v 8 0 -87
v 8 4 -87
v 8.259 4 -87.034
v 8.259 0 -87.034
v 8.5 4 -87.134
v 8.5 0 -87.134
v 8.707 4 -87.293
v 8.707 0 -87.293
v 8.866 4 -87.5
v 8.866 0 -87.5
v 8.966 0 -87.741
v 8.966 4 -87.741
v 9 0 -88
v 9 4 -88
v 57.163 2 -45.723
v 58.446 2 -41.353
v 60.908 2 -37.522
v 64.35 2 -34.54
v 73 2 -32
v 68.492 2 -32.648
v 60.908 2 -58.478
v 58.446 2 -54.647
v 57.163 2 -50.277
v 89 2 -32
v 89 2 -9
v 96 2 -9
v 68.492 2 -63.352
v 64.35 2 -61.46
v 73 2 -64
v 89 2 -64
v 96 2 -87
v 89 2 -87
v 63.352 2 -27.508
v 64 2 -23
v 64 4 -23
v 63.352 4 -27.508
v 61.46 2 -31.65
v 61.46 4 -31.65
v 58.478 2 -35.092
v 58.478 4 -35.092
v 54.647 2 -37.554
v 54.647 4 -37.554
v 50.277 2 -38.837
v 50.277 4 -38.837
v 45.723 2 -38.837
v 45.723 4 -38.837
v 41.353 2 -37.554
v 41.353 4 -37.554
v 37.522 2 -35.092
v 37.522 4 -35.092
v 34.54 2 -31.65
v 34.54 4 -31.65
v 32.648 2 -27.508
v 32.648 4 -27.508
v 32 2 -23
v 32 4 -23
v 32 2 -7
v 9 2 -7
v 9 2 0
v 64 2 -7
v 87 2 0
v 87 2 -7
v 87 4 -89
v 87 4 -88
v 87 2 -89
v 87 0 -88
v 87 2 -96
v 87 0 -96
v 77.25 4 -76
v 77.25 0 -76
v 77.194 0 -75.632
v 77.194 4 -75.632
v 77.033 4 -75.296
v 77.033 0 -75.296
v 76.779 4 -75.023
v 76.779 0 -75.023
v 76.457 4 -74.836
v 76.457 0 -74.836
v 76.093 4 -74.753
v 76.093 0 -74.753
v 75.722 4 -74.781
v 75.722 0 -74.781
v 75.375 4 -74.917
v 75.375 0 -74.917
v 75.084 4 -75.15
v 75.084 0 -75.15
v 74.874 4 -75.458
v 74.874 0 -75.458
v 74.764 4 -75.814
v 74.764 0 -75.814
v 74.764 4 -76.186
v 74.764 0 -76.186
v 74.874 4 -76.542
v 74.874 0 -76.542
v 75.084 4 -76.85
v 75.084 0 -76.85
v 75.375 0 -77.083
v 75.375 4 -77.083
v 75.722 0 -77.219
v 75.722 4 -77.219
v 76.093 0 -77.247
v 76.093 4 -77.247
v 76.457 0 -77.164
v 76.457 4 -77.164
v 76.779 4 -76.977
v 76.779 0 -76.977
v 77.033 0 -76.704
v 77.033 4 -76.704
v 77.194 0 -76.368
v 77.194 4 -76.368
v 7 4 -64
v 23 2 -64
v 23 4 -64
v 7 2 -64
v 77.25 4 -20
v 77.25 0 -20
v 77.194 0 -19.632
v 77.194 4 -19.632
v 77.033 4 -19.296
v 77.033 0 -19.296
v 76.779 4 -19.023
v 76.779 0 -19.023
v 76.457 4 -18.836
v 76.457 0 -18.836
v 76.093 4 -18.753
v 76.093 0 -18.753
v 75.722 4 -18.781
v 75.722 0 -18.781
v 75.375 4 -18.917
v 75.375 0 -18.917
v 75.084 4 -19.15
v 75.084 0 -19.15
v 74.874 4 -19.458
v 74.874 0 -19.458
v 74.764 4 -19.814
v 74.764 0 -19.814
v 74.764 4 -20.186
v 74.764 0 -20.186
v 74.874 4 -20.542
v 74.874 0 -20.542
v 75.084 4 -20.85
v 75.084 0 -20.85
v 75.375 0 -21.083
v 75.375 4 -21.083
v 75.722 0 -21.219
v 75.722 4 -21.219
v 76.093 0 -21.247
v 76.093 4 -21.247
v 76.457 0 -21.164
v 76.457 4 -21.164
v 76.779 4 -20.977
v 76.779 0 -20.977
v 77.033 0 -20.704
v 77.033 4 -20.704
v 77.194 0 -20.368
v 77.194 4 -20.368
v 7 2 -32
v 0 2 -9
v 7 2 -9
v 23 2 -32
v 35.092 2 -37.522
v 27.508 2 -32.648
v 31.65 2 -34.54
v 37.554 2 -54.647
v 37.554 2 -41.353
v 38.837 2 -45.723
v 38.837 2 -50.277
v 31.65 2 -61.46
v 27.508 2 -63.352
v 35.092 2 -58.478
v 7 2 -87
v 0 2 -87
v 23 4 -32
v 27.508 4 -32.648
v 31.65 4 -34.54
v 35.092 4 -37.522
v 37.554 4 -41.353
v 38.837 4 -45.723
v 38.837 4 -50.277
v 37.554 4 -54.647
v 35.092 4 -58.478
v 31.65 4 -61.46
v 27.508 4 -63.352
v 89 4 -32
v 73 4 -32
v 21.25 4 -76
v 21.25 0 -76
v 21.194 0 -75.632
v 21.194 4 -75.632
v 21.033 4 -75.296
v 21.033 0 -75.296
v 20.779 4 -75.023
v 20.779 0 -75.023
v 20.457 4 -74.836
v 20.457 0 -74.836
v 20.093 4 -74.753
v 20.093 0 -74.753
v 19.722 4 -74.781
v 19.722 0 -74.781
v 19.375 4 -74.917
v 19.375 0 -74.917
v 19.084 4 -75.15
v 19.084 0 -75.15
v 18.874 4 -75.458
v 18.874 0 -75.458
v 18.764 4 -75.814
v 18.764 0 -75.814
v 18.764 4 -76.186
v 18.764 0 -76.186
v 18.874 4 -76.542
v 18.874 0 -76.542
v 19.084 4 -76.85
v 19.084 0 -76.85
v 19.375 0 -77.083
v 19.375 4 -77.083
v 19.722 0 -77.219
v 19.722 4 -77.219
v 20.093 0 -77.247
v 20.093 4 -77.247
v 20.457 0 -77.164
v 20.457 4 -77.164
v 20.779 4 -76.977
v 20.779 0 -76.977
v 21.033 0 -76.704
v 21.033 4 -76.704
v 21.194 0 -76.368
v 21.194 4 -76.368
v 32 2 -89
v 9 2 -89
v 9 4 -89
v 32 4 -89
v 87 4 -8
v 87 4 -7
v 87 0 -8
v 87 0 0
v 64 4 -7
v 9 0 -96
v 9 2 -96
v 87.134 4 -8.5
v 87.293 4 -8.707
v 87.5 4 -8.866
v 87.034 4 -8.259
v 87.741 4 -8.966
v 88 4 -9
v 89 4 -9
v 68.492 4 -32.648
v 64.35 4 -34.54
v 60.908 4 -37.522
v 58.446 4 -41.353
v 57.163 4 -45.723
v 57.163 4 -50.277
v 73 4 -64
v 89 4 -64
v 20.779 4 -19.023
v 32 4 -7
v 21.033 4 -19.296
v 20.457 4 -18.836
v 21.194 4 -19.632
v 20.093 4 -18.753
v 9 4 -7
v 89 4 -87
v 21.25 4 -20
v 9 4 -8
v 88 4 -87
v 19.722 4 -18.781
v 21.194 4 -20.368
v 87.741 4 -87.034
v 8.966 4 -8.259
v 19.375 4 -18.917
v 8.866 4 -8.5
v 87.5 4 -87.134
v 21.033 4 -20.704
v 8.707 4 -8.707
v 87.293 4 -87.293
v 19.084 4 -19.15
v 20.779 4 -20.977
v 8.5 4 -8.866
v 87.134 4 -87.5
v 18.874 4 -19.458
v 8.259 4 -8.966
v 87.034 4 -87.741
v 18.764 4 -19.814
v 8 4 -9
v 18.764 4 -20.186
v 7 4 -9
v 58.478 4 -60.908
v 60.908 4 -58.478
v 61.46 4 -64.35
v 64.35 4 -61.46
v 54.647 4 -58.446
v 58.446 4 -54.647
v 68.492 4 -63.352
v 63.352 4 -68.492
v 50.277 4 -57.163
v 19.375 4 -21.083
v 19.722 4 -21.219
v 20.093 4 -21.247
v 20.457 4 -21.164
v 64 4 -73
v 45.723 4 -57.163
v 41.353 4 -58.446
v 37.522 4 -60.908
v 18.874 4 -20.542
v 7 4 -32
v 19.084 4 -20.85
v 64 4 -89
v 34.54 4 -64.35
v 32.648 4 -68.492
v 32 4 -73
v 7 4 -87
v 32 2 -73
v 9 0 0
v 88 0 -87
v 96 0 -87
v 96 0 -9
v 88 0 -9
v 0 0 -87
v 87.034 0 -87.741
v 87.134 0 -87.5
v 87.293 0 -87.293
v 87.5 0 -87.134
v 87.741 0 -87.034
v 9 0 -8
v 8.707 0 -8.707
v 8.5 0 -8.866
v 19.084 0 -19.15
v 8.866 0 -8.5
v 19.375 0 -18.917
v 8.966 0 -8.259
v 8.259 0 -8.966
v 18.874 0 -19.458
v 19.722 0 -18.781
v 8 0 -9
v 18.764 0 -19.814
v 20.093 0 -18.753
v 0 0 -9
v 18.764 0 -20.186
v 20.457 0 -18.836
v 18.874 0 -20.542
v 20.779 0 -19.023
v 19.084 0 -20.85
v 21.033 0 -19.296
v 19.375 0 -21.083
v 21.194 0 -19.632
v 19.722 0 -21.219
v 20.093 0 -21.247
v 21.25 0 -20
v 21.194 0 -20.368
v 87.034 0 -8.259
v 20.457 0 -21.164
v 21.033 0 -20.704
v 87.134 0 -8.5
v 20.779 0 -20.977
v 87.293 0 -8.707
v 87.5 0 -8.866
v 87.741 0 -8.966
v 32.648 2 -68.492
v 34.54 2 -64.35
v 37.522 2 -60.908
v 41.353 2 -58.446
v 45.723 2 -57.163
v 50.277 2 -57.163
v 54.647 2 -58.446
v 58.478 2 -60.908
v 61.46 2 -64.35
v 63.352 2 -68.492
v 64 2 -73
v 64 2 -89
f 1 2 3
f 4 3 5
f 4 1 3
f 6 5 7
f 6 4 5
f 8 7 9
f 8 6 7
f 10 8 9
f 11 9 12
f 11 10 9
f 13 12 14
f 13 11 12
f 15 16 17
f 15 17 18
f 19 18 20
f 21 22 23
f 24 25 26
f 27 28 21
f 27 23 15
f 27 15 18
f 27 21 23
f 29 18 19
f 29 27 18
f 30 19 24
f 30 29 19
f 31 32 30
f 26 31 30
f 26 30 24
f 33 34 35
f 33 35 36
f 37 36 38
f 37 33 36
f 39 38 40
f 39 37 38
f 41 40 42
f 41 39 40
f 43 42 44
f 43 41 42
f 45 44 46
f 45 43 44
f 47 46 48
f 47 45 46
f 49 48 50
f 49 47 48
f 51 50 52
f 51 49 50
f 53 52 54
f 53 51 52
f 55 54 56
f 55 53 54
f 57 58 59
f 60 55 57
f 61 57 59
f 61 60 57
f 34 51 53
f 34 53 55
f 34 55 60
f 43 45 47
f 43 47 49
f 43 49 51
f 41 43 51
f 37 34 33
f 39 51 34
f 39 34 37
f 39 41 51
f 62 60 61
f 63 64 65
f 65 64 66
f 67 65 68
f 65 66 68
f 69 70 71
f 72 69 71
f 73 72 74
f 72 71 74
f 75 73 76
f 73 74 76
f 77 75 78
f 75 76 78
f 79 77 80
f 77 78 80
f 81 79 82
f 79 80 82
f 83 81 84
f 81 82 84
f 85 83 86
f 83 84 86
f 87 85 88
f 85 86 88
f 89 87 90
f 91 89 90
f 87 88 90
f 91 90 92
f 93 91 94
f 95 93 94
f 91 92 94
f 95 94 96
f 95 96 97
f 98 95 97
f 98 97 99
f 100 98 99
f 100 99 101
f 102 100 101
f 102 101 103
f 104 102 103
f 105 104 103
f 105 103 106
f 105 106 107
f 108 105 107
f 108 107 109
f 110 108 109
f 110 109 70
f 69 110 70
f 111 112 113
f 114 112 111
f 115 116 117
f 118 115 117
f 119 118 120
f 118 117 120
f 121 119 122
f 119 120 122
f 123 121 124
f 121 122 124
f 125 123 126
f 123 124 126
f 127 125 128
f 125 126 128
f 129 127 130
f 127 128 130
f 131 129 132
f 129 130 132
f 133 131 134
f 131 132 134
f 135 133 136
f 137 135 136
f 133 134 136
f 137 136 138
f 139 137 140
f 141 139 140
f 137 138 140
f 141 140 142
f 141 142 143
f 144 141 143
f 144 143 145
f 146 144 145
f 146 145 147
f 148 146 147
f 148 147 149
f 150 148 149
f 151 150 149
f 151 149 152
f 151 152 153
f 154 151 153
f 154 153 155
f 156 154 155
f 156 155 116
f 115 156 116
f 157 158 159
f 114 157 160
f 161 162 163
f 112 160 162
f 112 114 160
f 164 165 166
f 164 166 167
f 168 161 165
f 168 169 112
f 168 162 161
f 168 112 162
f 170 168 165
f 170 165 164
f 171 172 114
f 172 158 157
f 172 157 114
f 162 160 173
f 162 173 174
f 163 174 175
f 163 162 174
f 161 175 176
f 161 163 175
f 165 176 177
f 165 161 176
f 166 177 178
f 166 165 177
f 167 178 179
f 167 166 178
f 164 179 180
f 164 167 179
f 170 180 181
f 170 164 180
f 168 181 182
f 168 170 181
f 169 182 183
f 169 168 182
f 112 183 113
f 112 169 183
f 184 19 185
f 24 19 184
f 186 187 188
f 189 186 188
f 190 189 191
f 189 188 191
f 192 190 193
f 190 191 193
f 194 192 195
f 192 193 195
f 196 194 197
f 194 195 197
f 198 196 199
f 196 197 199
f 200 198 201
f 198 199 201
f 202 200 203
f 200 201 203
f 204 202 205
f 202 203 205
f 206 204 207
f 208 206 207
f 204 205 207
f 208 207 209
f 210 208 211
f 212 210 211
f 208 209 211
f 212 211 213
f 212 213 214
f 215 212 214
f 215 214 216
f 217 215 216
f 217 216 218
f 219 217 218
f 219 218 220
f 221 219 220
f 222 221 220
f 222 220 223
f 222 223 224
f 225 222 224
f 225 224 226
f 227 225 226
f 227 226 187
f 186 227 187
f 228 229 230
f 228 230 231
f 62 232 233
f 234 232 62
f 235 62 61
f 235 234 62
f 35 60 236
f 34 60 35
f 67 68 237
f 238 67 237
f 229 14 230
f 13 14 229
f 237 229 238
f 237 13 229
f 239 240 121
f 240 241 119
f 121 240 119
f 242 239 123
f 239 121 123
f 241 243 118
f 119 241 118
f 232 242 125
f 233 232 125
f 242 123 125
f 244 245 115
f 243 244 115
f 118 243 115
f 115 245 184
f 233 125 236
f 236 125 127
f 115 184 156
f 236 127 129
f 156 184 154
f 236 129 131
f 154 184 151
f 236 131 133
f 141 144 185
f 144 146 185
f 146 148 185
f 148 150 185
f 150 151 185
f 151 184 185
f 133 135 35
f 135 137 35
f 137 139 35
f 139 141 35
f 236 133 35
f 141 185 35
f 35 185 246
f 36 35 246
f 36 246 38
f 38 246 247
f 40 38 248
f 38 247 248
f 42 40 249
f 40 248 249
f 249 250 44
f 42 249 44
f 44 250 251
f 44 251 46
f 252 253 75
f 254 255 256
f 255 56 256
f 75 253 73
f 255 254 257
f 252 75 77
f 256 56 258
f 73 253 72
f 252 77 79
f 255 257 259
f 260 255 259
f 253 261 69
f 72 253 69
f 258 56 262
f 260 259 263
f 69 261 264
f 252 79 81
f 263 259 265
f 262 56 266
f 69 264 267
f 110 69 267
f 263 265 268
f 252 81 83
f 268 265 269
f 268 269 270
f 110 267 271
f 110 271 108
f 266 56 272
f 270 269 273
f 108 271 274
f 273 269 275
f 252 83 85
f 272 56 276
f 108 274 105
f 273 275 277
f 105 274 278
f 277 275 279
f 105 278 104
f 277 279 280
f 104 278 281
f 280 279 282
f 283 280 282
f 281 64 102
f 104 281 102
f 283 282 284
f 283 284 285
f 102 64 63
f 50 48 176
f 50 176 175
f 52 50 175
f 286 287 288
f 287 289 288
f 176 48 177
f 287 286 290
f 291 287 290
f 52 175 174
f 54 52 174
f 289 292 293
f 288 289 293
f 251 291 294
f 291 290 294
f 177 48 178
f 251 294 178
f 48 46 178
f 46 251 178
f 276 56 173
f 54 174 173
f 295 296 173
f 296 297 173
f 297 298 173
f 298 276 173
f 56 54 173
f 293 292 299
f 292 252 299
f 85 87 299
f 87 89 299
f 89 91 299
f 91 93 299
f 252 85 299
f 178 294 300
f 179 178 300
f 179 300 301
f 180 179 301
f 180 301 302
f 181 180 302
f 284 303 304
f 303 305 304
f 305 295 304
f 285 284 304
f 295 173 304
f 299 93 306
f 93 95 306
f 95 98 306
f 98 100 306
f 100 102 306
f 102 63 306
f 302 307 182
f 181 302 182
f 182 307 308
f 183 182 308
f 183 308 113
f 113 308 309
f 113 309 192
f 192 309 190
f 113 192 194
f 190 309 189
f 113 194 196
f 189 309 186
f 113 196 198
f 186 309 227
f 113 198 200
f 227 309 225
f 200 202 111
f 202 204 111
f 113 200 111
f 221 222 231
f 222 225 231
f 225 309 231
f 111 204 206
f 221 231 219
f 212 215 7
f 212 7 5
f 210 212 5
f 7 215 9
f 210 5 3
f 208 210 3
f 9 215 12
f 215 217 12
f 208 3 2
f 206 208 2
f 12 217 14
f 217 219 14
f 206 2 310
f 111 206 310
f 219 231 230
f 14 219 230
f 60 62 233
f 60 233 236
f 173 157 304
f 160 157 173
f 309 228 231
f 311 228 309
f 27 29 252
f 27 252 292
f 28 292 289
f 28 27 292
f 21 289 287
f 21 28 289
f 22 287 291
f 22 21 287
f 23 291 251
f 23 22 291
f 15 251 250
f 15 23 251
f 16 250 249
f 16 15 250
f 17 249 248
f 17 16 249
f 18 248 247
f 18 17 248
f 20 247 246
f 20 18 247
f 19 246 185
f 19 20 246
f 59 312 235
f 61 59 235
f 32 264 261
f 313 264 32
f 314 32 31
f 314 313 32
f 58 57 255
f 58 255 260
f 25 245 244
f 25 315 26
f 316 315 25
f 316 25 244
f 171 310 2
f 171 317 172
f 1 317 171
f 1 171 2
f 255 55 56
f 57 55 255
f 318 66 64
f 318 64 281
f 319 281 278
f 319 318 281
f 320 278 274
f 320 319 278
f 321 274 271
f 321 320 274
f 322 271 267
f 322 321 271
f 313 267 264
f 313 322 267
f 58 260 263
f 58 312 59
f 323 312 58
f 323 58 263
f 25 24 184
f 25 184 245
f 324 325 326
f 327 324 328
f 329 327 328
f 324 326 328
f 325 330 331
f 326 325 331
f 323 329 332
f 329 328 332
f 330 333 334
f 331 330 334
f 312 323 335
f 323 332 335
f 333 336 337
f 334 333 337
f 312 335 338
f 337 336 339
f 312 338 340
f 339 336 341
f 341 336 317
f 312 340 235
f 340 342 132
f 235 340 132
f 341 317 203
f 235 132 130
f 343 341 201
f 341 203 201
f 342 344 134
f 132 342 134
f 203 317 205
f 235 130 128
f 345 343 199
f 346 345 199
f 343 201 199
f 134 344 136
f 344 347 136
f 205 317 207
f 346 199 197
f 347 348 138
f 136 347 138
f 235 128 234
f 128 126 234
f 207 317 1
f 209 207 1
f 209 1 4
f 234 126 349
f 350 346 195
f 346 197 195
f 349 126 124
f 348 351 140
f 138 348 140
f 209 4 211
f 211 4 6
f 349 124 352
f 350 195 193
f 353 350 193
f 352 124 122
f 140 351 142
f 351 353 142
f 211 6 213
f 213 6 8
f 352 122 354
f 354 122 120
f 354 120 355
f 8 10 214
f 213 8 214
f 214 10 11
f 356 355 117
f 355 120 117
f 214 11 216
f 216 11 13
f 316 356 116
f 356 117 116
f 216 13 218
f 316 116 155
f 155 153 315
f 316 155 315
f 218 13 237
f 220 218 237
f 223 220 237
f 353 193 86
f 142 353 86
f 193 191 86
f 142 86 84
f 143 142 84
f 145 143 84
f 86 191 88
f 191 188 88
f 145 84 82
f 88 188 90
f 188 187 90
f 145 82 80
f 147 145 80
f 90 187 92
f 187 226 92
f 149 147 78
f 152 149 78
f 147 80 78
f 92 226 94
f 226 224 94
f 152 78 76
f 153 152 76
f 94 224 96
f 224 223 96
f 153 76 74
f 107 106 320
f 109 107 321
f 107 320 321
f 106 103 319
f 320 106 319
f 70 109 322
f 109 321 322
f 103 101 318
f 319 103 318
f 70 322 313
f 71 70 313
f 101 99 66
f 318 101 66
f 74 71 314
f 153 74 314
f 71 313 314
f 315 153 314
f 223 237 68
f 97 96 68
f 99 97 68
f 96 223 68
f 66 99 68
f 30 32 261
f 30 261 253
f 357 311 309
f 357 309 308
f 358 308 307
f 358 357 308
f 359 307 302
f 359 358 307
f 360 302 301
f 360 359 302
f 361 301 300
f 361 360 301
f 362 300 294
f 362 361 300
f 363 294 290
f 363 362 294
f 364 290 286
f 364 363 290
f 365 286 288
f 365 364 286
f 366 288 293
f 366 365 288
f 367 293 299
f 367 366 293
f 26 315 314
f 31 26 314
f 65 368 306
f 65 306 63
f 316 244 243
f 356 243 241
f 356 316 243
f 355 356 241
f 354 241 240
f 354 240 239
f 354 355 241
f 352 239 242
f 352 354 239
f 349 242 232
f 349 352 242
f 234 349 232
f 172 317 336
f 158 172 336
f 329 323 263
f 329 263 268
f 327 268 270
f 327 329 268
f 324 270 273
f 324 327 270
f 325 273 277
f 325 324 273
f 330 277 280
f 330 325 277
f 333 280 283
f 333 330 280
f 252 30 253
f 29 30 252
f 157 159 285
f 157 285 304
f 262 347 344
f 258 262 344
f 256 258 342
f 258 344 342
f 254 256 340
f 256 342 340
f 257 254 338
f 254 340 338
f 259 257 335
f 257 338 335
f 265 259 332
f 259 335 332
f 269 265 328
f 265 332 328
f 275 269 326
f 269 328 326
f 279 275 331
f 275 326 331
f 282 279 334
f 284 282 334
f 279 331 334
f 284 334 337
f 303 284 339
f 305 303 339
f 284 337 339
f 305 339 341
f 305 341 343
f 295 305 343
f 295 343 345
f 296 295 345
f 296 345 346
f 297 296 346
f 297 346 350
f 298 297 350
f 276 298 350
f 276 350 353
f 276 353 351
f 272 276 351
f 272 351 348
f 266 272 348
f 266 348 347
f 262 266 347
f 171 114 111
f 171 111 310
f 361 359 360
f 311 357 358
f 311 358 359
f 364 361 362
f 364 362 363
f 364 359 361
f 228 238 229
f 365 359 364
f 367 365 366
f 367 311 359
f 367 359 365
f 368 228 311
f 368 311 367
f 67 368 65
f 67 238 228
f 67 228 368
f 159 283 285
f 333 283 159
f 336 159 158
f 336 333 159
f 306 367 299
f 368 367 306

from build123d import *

# Parameters (mm, degrees)
BASE_DEPTH                         = 2
ANTENNA_STORAGE_DEPTH              = 2
M3X0_5_TAPPED_HOLES_FOR_MOUNTING_D = 2.5


with BuildPart() as part:
    # Sketch1 → Base (new body)
    with BuildSketch(Plane(origin=(0, 0, 0), x_dir=(1, 0, 0), z_dir=(0, 1, 0))):
        with BuildLine():
            Line((0, 9), (8, 9))
            ThreePointArc((8, 9), (8.707106781, 8.707106781), (9, 8))
            Line((9, 8), (9, 0))
            Line((9, 0), (87, 0))
            Line((87, 0), (87, 8))
            ThreePointArc((87, 8), (87.292893219, 8.707106781), (88, 9))
            Line((88, 9), (96, 9))
            Line((96, 9), (96, 87))
            Line((96, 87), (88, 87))
            ThreePointArc((88, 87), (87.292893219, 87.292893219), (87, 88))
            Line((87, 88), (87, 96))
            Line((87, 96), (9, 96))
            Line((9, 96), (9, 88))
            ThreePointArc((9, 88), (8.707106781, 87.292893219), (8, 87))
            Line((8, 87), (0, 87))
            Line((0, 87), (0, 9))
        make_face()
    extrude(amount=BASE_DEPTH)

    # Sketch2 → Antenna Storage (add)
    with BuildSketch(Plane(origin=(0, 2, 0), x_dir=(1, 0, 0), z_dir=(0, 1, 0))):
        with BuildLine():
            Line((32, 89), (32, 73))
            ThreePointArc((32, 73), (48, 57), (64, 73))
            Line((64, 73), (64, 89))
            Line((64, 89), (87, 89))
            Line((87, 89), (87, 88))
            ThreePointArc((87, 88), (87.292893219, 87.292893219), (88, 87))
            Line((88, 87), (89, 87))
            Line((89, 87), (89, 64))
            Line((89, 64), (73, 64))
            ThreePointArc((73, 64), (57, 48), (73, 32))
            Line((73, 32), (89, 32))
            Line((89, 32), (89, 9))
            Line((89, 9), (88, 9))
            ThreePointArc((88, 9), (87.292893219, 8.707106781), (87, 8))
            Line((87, 8), (87, 7))
            Line((87, 7), (64, 7))
            Line((64, 7), (64, 23))
            ThreePointArc((64, 23), (48, 39), (32, 23))
            Line((32, 23), (32, 7))
            Line((32, 7), (9, 7))
            Line((9, 7), (9, 8))
            ThreePointArc((9, 8), (8.707106781, 8.707106781), (8, 9))
            Line((8, 9), (7, 9))
            Line((7, 9), (7, 32))
            Line((7, 32), (23, 32))
            ThreePointArc((23, 32), (39, 48), (23, 64))
            Line((23, 64), (7, 64))
            Line((7, 64), (7, 87))
            Line((7, 87), (8, 87))
            ThreePointArc((8, 87), (8.707106781, 87.292893219), (9, 88))
            Line((9, 88), (9, 89))
            Line((9, 89), (32, 89))
        make_face()
    extrude(amount=ANTENNA_STORAGE_DEPTH)

    # M3x0.5 Tapped Holes For Mounting (through all)
    with Locations(Plane(origin=(0, 4, 0), x_dir=(-1, 0, 0), z_dir=(0, 1, 0))):
        with Locations((-20, -20), (-20, -76), (-76, -20), (-76, -76)):
            Hole(M3X0_5_TAPPED_HOLES_FOR_MOUNTING_D / 2)


solid = part.part
